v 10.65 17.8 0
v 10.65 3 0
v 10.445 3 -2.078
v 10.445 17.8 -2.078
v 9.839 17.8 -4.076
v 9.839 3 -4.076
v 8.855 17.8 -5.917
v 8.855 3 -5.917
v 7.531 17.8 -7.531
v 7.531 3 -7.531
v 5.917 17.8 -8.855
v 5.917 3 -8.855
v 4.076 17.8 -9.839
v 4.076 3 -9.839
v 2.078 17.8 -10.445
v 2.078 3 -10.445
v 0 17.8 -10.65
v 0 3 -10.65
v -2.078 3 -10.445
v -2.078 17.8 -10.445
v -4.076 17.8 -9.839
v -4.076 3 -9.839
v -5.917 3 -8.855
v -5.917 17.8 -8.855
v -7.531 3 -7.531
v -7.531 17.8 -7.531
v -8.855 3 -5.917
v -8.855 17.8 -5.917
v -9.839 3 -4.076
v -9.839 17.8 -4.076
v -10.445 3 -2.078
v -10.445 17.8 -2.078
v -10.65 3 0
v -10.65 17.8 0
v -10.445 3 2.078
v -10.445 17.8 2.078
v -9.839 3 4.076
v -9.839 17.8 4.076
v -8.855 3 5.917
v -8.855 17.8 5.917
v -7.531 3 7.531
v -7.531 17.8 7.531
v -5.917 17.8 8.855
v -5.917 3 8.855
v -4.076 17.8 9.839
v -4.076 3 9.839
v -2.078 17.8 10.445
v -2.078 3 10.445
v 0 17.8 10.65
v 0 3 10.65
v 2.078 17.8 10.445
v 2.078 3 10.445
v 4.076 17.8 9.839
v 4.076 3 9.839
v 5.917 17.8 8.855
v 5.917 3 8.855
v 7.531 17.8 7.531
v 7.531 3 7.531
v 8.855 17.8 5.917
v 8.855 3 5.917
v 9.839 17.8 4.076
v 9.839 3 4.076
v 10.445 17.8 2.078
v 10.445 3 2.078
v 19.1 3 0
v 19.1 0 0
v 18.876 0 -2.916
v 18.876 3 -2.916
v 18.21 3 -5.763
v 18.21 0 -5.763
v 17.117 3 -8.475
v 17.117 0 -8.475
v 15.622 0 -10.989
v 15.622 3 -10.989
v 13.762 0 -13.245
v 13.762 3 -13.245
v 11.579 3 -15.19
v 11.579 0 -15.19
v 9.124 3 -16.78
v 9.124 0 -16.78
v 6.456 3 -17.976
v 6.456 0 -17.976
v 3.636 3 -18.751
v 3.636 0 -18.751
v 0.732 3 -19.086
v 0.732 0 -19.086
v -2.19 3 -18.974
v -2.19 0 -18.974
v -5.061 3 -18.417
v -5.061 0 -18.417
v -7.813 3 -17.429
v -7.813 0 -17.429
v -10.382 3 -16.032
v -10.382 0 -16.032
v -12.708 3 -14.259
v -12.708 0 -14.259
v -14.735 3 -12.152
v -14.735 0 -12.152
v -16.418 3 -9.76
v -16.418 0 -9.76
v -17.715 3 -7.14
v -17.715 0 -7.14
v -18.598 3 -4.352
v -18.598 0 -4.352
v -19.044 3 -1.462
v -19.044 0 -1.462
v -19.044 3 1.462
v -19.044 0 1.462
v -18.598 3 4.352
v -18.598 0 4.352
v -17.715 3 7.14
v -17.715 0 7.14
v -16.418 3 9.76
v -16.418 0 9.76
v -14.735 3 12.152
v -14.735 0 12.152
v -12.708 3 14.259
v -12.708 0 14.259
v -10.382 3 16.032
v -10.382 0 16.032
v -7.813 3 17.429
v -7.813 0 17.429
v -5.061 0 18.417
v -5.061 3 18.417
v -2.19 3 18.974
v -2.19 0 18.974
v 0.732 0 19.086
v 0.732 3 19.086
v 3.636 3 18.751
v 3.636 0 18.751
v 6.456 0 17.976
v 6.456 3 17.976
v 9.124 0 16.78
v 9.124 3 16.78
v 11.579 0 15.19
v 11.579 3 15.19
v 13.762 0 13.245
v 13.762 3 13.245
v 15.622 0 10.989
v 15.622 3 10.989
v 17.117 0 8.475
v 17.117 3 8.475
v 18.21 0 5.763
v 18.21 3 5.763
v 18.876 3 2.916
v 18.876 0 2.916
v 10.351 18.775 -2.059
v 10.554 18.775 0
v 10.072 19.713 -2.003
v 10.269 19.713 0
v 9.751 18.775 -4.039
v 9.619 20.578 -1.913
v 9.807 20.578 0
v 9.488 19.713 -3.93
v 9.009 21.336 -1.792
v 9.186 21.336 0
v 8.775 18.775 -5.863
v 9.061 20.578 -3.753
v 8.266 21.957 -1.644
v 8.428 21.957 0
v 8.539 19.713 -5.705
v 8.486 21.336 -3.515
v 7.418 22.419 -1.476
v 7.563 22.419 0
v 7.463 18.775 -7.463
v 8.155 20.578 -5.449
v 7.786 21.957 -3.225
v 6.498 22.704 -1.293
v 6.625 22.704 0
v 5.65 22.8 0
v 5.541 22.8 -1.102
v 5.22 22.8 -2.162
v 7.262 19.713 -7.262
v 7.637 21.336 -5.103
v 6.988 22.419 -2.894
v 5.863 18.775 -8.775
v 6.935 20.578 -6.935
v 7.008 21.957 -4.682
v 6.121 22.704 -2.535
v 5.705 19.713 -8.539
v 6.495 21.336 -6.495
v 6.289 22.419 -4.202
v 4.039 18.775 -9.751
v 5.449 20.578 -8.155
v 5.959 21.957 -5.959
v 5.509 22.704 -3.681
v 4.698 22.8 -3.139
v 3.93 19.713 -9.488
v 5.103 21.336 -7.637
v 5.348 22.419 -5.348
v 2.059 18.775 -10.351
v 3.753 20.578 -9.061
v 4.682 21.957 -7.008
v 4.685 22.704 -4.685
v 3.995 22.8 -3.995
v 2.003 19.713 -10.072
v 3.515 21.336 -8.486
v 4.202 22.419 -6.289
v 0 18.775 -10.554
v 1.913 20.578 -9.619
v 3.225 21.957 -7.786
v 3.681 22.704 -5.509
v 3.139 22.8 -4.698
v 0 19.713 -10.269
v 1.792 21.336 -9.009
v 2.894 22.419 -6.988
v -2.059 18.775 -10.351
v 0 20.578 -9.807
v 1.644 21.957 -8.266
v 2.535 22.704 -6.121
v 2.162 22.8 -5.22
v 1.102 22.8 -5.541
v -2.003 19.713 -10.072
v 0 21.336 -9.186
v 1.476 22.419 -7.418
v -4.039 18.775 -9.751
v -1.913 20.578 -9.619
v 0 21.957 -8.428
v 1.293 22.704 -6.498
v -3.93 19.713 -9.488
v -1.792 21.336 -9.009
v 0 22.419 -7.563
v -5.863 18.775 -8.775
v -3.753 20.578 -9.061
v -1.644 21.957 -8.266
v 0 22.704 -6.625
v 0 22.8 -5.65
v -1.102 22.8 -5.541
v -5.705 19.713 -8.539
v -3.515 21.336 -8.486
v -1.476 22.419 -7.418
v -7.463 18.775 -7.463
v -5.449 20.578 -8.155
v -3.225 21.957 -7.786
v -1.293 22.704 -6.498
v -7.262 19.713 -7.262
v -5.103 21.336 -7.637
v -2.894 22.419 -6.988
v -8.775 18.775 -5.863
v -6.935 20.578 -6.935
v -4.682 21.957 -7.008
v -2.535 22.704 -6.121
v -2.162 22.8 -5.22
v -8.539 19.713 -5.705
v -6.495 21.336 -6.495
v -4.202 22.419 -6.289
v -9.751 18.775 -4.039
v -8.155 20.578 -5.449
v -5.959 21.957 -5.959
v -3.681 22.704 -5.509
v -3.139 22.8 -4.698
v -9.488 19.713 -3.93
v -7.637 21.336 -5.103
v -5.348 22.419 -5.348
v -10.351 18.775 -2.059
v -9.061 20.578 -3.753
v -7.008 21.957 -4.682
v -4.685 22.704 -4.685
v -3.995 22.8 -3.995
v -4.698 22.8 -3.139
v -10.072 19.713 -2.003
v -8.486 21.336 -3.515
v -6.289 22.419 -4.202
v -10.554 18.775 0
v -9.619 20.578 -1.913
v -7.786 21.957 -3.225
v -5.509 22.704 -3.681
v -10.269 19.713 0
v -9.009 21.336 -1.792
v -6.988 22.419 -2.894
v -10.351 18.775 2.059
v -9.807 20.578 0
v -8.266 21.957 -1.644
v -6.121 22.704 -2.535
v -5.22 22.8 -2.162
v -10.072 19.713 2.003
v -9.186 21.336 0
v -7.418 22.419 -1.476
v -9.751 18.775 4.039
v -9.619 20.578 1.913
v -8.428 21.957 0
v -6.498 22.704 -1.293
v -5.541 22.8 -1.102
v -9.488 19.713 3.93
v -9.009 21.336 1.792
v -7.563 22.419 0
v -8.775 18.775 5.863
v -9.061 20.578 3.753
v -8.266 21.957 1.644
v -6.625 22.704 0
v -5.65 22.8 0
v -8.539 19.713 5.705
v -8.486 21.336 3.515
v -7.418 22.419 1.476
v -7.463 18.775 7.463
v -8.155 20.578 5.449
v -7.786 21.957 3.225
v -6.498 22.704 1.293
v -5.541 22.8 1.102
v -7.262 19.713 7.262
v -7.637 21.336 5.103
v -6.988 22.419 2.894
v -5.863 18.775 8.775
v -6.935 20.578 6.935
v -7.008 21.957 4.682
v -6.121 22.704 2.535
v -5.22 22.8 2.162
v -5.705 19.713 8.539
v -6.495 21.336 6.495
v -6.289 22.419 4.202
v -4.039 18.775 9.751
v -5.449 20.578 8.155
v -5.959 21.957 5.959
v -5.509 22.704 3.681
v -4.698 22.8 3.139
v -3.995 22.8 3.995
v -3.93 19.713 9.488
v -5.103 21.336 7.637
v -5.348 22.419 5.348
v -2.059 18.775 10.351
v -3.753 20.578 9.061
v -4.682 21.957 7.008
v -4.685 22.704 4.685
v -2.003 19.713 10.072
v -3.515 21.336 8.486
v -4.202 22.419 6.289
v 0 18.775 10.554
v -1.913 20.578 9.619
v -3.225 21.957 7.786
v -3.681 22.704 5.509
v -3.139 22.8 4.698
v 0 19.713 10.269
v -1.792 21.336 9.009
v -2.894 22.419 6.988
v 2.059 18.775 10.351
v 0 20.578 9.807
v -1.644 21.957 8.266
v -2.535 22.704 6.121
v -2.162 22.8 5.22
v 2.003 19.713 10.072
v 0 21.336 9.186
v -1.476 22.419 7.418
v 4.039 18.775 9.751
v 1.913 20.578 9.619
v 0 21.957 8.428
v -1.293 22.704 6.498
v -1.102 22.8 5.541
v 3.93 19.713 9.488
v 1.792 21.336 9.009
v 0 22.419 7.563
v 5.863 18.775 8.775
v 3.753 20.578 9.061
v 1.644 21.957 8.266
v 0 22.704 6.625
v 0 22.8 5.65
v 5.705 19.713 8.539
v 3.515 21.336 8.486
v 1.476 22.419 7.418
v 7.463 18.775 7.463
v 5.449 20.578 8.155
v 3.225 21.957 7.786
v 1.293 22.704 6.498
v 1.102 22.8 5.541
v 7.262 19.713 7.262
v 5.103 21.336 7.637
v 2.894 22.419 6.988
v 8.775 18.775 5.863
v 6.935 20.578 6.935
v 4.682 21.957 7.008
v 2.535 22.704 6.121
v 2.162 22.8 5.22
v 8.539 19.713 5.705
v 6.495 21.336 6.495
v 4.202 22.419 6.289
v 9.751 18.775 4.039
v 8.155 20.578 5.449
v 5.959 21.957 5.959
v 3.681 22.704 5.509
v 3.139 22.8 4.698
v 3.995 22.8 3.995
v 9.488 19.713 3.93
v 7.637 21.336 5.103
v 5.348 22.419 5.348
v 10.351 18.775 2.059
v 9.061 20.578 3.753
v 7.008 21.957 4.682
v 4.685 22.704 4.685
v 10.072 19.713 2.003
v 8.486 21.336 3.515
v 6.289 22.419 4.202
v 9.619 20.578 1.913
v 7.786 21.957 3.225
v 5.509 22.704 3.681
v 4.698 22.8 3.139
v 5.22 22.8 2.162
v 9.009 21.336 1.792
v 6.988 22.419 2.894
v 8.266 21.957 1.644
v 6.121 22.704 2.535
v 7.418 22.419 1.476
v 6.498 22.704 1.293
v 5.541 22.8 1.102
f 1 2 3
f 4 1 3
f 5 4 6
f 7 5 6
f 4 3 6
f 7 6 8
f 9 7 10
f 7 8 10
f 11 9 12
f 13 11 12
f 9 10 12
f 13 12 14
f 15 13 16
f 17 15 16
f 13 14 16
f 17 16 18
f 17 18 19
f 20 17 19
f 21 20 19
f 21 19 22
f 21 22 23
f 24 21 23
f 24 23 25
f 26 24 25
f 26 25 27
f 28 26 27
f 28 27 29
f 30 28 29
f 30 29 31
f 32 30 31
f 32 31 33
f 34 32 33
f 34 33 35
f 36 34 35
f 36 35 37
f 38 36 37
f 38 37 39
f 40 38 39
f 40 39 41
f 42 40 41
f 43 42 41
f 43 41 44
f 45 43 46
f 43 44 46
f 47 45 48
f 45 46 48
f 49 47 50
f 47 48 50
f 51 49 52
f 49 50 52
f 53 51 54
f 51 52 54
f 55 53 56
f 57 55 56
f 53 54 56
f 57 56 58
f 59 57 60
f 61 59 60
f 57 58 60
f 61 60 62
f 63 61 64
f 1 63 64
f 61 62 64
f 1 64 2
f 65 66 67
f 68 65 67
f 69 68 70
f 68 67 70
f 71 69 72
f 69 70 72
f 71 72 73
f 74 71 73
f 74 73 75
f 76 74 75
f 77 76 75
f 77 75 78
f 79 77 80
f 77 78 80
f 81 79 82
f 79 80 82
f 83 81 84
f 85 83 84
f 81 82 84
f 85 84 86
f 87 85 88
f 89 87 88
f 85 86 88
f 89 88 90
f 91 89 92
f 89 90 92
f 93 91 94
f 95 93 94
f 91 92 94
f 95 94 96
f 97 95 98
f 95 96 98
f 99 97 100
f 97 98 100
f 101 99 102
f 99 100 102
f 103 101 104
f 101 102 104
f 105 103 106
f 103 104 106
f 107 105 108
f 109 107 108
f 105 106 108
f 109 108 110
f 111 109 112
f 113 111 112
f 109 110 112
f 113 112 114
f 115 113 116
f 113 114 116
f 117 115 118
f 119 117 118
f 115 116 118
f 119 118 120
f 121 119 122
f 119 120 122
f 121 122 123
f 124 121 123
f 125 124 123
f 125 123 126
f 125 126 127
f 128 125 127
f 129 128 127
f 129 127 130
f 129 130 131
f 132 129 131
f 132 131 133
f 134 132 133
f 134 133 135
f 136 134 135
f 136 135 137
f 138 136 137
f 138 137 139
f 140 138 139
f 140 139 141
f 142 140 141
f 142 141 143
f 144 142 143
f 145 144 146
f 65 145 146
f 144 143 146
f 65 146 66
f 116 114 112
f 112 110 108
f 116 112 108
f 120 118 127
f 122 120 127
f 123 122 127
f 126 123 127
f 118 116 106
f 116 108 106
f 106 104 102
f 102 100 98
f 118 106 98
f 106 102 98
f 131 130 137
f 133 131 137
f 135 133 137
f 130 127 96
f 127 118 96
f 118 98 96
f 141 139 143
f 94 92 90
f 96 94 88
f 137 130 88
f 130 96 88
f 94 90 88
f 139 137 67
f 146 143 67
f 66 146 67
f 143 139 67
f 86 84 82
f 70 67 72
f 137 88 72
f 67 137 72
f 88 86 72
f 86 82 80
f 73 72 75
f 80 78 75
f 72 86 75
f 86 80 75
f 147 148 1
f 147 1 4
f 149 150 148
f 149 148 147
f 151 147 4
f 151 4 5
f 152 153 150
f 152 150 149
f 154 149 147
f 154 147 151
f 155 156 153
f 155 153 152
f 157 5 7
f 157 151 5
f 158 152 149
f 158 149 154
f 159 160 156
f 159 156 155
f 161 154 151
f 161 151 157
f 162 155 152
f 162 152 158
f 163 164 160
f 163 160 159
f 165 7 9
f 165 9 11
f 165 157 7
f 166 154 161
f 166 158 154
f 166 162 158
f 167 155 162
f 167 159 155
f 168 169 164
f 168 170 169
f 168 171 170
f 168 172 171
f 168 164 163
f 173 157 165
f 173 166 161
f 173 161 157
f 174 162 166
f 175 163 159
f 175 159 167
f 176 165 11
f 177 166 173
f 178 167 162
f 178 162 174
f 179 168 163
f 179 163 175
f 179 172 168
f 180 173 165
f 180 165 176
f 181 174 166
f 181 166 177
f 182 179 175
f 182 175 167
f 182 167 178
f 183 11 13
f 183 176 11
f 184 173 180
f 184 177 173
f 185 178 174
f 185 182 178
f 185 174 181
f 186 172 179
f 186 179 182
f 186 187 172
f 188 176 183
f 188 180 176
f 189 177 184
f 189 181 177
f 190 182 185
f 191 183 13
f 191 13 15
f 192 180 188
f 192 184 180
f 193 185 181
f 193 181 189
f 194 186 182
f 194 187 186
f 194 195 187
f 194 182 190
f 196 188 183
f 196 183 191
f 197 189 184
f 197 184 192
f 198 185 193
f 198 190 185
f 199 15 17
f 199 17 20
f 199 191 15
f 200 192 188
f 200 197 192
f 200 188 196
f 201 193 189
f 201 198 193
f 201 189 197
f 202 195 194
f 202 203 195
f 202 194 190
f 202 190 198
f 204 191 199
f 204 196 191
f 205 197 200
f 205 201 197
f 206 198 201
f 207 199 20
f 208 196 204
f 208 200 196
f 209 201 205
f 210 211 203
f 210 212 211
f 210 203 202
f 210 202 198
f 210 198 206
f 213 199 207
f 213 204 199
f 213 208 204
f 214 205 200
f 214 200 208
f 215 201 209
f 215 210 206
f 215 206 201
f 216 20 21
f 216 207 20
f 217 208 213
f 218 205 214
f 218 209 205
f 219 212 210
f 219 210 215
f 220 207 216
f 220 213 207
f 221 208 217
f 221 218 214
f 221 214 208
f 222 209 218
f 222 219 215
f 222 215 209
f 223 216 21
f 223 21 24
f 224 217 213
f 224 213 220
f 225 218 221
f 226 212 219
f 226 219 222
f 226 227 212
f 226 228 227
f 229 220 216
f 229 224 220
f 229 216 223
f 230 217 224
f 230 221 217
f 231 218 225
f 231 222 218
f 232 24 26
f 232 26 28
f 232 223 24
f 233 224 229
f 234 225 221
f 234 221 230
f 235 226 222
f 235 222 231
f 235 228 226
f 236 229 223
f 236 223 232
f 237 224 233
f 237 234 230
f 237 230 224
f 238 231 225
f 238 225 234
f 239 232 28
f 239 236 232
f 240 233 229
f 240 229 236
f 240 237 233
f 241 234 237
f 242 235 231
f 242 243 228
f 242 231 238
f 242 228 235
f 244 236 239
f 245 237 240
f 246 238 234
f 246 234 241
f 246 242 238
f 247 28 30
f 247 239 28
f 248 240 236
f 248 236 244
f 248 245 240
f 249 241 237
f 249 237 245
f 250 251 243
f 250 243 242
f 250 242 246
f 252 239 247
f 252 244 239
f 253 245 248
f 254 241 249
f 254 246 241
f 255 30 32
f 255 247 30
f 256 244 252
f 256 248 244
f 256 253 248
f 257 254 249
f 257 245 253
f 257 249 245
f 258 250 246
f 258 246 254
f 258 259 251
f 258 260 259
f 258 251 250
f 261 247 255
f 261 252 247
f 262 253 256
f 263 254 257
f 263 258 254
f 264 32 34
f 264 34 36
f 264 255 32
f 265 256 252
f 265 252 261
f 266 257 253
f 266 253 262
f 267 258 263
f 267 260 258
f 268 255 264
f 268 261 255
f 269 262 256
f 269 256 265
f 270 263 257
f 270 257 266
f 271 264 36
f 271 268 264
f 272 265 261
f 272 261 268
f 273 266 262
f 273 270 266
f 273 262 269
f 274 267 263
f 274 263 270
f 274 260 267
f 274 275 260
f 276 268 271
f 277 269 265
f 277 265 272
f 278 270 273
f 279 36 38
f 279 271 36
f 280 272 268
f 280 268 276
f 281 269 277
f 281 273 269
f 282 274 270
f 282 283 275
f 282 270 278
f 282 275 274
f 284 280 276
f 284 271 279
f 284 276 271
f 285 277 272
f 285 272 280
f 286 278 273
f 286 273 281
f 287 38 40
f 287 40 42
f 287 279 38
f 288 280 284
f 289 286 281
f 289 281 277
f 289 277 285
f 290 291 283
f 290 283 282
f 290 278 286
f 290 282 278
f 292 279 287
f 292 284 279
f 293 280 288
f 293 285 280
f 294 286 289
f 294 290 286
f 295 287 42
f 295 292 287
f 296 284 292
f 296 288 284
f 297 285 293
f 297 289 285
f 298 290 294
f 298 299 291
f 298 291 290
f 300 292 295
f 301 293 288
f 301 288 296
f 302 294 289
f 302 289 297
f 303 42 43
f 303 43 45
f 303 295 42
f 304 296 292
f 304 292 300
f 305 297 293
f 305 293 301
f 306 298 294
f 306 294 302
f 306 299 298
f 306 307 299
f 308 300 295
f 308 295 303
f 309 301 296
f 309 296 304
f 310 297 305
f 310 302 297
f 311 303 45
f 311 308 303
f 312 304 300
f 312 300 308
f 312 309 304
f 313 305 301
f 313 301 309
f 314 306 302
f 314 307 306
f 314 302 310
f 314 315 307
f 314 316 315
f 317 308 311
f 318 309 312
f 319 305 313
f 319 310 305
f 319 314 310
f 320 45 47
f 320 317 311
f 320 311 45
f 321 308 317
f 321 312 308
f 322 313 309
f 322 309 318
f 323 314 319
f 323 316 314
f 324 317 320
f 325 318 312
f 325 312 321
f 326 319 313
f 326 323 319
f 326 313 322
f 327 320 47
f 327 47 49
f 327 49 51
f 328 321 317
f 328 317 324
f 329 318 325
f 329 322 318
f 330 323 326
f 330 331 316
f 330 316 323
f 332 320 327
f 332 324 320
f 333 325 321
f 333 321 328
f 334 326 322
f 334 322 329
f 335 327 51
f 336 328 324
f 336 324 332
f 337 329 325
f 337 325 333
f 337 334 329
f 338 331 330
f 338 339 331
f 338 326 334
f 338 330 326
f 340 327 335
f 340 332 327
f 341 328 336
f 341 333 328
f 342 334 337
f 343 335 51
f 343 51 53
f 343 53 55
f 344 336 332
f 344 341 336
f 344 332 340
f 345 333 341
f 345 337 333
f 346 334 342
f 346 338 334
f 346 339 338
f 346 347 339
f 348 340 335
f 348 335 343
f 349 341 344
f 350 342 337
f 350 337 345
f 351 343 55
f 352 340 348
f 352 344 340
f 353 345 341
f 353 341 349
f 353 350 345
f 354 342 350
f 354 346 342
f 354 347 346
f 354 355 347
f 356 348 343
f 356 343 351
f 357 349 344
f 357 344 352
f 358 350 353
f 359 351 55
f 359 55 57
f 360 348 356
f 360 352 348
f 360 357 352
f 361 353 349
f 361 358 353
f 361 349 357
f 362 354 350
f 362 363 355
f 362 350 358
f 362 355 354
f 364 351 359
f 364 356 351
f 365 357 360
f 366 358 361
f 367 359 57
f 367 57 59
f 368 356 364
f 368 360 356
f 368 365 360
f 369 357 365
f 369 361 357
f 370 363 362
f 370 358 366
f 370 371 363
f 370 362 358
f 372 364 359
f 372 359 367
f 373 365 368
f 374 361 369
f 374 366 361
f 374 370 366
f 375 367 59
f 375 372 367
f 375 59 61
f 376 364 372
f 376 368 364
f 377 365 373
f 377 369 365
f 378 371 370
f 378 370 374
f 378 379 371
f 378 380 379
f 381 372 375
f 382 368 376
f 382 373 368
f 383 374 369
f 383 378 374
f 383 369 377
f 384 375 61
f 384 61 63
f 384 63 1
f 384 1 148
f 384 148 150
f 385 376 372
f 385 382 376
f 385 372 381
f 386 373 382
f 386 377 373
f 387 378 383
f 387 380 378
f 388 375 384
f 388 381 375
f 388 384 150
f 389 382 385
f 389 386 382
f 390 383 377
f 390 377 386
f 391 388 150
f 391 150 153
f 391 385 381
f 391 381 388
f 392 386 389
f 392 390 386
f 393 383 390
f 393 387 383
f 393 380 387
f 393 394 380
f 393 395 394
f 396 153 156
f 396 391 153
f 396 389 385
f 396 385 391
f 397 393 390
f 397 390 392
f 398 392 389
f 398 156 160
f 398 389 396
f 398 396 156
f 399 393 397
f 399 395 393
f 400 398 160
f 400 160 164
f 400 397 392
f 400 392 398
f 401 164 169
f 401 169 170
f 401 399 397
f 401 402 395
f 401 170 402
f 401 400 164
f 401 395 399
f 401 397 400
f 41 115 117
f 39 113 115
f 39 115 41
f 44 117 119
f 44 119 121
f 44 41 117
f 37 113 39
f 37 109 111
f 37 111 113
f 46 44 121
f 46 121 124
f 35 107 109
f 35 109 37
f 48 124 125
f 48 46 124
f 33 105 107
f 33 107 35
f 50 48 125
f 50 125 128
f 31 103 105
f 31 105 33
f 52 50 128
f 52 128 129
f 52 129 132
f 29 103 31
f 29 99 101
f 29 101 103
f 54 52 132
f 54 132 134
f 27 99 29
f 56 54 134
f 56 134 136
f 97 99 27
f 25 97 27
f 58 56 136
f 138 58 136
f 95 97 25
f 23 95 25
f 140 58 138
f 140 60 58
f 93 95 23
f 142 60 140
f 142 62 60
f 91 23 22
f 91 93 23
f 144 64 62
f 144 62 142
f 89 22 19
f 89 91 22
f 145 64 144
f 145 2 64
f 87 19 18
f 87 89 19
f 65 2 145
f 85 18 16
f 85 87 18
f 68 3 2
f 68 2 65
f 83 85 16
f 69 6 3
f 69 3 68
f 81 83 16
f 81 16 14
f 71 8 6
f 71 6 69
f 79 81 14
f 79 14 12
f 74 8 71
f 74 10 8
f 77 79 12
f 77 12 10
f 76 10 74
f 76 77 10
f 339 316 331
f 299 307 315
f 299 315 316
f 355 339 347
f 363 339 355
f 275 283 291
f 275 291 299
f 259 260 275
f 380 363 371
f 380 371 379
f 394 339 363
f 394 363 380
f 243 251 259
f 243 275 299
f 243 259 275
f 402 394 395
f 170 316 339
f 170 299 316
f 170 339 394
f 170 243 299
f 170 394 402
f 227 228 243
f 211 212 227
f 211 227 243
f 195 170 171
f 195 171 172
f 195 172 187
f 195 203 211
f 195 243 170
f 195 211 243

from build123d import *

# Parameters (mm, degrees)
SKETCH1_R           = 19.1
SKETCH1_R_2         = 10.65
BOSS_EXTRUDE1_DEPTH = 3
SKETCH1_2_R         = 10.65
BOSS_EXTRUDE2_DEPTH = 22.8
FILLET1_R           = 5


with BuildPart() as part:
    # Sketch1 → Boss-Extrude1 (new body)
    with BuildSketch(Plane(origin=(0, 0, 0), x_dir=(1, 0, 0), z_dir=(0, 1, 0))):
        Circle(SKETCH1_R)
        Circle(SKETCH1_R_2, mode=Mode.SUBTRACT)
    extrude(amount=BOSS_EXTRUDE1_DEPTH)

    # Sketch1<2> → Boss-Extrude2 (add)
    with BuildSketch(Plane(origin=(0, 0, 0), x_dir=(1, 0, 0), z_dir=(0, 1, 0))):
        Circle(SKETCH1_2_R)
    extrude(amount=BOSS_EXTRUDE2_DEPTH)

    # Fillet1
    fillet1_edges = [part.edges().sort_by_distance(p)[0] for p in [
        (-10.65, 22.8, 0),
    ]]
    fillet(fillet1_edges, radius=FILLET1_R)


solid = part.part
